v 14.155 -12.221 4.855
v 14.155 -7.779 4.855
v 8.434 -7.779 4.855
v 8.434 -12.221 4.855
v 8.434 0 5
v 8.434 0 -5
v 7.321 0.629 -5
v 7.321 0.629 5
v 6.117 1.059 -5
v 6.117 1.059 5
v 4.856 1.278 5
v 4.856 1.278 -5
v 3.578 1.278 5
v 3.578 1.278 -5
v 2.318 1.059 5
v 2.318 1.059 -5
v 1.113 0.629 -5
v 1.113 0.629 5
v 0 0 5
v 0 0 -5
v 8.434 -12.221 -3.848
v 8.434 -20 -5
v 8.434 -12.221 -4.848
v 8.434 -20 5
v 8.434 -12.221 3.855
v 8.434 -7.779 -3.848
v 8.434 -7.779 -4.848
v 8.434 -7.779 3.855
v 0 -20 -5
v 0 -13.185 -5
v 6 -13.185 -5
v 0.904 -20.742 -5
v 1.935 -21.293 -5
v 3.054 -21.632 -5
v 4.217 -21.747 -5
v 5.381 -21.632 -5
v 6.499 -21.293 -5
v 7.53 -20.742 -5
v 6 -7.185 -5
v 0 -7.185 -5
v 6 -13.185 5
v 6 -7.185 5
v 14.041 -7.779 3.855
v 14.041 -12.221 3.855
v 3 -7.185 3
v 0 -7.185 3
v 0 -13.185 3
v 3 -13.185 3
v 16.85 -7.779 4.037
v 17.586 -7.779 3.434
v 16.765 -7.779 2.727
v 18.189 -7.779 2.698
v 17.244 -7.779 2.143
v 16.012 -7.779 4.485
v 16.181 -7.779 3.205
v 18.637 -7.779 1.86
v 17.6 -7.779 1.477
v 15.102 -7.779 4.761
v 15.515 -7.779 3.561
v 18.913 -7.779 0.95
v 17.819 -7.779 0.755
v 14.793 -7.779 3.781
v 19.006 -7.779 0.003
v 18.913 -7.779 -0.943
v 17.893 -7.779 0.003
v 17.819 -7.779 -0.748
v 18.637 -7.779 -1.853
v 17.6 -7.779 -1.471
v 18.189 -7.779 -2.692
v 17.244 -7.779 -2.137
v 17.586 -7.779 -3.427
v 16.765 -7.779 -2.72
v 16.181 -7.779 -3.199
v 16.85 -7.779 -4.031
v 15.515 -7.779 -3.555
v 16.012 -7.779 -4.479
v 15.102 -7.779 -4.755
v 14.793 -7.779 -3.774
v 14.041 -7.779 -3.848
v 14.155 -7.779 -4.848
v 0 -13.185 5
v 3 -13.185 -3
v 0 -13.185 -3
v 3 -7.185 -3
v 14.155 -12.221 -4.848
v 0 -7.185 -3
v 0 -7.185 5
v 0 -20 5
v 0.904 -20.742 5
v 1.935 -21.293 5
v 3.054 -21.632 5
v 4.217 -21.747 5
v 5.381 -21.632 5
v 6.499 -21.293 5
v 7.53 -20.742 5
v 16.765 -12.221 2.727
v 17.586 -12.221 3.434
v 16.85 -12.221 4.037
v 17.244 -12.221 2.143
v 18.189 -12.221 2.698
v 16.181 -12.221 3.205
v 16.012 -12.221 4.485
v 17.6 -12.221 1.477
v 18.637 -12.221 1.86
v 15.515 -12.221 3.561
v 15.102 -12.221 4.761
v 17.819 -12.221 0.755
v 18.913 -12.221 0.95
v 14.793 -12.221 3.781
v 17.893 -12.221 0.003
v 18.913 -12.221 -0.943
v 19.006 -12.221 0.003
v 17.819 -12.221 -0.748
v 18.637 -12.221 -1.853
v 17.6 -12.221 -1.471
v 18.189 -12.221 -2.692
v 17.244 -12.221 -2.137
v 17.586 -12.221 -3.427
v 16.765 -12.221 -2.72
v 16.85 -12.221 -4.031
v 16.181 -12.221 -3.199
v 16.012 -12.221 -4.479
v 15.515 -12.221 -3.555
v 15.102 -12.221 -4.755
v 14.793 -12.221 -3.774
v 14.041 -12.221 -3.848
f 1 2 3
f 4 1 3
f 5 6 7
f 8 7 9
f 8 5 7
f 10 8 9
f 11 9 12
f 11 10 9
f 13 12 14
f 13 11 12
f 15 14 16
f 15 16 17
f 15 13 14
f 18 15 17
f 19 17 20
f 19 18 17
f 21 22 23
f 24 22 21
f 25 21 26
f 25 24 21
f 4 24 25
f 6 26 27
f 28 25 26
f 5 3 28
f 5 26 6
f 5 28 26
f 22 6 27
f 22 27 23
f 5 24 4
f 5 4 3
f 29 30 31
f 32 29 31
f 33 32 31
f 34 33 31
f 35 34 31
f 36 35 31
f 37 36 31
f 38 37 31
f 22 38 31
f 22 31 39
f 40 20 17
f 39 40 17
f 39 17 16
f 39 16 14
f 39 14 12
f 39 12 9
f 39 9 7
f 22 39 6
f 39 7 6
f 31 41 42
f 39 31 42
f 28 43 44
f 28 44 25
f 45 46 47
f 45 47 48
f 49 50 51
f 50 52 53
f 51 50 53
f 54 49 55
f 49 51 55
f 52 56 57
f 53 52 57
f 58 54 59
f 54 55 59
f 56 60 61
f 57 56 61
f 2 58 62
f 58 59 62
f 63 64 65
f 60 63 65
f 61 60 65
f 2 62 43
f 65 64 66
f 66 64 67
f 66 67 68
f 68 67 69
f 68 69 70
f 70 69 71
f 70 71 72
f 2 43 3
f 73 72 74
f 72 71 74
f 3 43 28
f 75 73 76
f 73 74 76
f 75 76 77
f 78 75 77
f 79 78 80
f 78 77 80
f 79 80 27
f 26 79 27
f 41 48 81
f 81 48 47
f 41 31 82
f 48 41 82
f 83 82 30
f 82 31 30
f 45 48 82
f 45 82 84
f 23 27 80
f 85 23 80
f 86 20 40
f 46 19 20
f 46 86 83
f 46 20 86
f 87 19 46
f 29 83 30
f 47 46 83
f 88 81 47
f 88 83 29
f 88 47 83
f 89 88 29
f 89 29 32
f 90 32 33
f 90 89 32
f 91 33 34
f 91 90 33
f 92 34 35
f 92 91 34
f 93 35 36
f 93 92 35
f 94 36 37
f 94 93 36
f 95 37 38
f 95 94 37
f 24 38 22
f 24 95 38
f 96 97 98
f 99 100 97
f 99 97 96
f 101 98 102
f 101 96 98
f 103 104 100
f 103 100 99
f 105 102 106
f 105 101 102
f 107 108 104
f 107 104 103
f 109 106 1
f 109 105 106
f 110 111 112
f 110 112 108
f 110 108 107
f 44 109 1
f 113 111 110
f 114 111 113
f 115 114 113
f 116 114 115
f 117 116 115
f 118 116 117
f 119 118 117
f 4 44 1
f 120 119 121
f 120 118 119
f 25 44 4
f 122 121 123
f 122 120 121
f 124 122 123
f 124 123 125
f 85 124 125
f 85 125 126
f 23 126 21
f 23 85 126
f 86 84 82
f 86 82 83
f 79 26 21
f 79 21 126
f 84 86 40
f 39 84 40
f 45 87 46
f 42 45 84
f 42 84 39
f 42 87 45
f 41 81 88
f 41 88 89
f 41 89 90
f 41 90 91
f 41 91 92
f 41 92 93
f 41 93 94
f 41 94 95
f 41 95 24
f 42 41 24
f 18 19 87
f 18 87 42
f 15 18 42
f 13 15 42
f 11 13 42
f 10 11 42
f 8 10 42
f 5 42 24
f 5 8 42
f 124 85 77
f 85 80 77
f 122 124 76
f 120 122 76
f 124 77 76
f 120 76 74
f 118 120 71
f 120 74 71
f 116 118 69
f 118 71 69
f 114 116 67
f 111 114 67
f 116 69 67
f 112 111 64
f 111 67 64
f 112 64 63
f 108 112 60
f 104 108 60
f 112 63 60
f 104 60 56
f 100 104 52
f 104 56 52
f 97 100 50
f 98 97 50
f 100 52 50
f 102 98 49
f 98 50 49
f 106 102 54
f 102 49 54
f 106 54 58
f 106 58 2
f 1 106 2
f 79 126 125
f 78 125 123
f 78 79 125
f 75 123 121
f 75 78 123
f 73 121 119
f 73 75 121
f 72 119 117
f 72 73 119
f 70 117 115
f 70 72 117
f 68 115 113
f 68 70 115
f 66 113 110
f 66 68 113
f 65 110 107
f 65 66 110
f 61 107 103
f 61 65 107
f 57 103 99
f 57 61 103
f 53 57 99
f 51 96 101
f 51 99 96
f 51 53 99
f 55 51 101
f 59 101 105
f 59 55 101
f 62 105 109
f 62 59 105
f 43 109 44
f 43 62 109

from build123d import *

# Parameters (mm, degrees)
EXTRUDE_1_DEPTH     = 5
EXTRUDE_7_DEPTH     = 2.220844282
CUT_EXTRUDE_5_DEPTH = 4.5
SKETCH_22_W         = 3
SKETCH_22_H         = 6
CUT_EXTRUDE_7_DEPTH = 10
SKETCH_24_W         = 3
SKETCH_24_H         = 6
CUT_EXTRUDE_8_DEPTH = 2
SKETCH_25_W         = 3
SKETCH_25_H         = 6
CUT_EXTRUDE_9_DEPTH = 2


with BuildPart() as part:
    # 草圖1 → 填料-伸長1 (new, symmetric)
    with BuildSketch(Plane.XY):
        with BuildLine():
            Line((0, 0), (0, -20))
            ThreePointArc((0, -20), (4.217076995, -21.746770485), (8.434153991, -20))
            Line((8.434153991, -20), (8.434153991, 0))
            ThreePointArc((8.434153991, 0), (4.217076995, 1.305083655), (0, 0))
        make_face()
    extrude(amount=EXTRUDE_1_DEPTH, both=True)

    # 草圖19 → 填料-伸長7 (add, symmetric)
    with BuildSketch(Plane(origin=(-5.031859453, -10, 0), x_dir=(1, 0, 0), z_dir=(0, 1, 0))):
        with BuildLine():
            Line((8.364623855, 4.848181061), (19.186976182, 4.848181061))
            ThreePointArc((19.186976182, 4.848181061), (24.038353521, -0.003196277), (19.186976182, -4.854573616))
            Line((19.186976182, -4.854573616), (8.364623855, -4.854573616))
            Line((8.364623855, -4.854573616), (8.364623855, 4.848181061))
        make_face()
    extrude(amount=EXTRUDE_7_DEPTH, both=True)

    # 草圖21 → 除料-伸長5 (cut)
    with BuildSketch(Plane(origin=(0, -7.779155718, 0), x_dir=(1, 0, 0), z_dir=(0, 1, 0))):
        with BuildLine():
            Line((8.434153991, 3.848181061), (14.041459842, 3.848181061))
            ThreePointArc((14.041459842, 3.848181061), (17.892837181, -0.003196277), (14.041459842, -3.854573616))
            Line((14.041459842, -3.854573616), (8.434153991, -3.854573616))
            Line((8.434153991, -3.854573616), (8.434153991, 3.848181061))
        make_face()
    extrude(amount=-CUT_EXTRUDE_5_DEPTH, mode=Mode.SUBTRACT)

    # 草圖22 → 除料-伸長7 (cut)
    with BuildSketch(Plane.XY.offset(5)):
        with Locations((4.5, -10.185420111)):
            Rectangle(SKETCH_22_W, SKETCH_22_H)
    extrude(amount=-CUT_EXTRUDE_7_DEPTH, mode=Mode.SUBTRACT)

    # 草圖24 → 除料-伸長8 (cut)
    with BuildSketch(Plane(origin=(0, 0, -5), x_dir=(-1, 0, 0), z_dir=(0, 0, -1))):
        with Locations((-1.5, -10.185420111)):
            Rectangle(SKETCH_24_W, SKETCH_24_H)
    extrude(amount=-CUT_EXTRUDE_8_DEPTH, mode=Mode.SUBTRACT)

    # 草圖25 → 除料-伸長9 (cut)
    with BuildSketch(Plane.XY.offset(5)):
        with Locations((1.5, -10.185420111)):
            Rectangle(SKETCH_25_W, SKETCH_25_H)
    extrude(amount=-CUT_EXTRUDE_9_DEPTH, mode=Mode.SUBTRACT)


solid = part.part
